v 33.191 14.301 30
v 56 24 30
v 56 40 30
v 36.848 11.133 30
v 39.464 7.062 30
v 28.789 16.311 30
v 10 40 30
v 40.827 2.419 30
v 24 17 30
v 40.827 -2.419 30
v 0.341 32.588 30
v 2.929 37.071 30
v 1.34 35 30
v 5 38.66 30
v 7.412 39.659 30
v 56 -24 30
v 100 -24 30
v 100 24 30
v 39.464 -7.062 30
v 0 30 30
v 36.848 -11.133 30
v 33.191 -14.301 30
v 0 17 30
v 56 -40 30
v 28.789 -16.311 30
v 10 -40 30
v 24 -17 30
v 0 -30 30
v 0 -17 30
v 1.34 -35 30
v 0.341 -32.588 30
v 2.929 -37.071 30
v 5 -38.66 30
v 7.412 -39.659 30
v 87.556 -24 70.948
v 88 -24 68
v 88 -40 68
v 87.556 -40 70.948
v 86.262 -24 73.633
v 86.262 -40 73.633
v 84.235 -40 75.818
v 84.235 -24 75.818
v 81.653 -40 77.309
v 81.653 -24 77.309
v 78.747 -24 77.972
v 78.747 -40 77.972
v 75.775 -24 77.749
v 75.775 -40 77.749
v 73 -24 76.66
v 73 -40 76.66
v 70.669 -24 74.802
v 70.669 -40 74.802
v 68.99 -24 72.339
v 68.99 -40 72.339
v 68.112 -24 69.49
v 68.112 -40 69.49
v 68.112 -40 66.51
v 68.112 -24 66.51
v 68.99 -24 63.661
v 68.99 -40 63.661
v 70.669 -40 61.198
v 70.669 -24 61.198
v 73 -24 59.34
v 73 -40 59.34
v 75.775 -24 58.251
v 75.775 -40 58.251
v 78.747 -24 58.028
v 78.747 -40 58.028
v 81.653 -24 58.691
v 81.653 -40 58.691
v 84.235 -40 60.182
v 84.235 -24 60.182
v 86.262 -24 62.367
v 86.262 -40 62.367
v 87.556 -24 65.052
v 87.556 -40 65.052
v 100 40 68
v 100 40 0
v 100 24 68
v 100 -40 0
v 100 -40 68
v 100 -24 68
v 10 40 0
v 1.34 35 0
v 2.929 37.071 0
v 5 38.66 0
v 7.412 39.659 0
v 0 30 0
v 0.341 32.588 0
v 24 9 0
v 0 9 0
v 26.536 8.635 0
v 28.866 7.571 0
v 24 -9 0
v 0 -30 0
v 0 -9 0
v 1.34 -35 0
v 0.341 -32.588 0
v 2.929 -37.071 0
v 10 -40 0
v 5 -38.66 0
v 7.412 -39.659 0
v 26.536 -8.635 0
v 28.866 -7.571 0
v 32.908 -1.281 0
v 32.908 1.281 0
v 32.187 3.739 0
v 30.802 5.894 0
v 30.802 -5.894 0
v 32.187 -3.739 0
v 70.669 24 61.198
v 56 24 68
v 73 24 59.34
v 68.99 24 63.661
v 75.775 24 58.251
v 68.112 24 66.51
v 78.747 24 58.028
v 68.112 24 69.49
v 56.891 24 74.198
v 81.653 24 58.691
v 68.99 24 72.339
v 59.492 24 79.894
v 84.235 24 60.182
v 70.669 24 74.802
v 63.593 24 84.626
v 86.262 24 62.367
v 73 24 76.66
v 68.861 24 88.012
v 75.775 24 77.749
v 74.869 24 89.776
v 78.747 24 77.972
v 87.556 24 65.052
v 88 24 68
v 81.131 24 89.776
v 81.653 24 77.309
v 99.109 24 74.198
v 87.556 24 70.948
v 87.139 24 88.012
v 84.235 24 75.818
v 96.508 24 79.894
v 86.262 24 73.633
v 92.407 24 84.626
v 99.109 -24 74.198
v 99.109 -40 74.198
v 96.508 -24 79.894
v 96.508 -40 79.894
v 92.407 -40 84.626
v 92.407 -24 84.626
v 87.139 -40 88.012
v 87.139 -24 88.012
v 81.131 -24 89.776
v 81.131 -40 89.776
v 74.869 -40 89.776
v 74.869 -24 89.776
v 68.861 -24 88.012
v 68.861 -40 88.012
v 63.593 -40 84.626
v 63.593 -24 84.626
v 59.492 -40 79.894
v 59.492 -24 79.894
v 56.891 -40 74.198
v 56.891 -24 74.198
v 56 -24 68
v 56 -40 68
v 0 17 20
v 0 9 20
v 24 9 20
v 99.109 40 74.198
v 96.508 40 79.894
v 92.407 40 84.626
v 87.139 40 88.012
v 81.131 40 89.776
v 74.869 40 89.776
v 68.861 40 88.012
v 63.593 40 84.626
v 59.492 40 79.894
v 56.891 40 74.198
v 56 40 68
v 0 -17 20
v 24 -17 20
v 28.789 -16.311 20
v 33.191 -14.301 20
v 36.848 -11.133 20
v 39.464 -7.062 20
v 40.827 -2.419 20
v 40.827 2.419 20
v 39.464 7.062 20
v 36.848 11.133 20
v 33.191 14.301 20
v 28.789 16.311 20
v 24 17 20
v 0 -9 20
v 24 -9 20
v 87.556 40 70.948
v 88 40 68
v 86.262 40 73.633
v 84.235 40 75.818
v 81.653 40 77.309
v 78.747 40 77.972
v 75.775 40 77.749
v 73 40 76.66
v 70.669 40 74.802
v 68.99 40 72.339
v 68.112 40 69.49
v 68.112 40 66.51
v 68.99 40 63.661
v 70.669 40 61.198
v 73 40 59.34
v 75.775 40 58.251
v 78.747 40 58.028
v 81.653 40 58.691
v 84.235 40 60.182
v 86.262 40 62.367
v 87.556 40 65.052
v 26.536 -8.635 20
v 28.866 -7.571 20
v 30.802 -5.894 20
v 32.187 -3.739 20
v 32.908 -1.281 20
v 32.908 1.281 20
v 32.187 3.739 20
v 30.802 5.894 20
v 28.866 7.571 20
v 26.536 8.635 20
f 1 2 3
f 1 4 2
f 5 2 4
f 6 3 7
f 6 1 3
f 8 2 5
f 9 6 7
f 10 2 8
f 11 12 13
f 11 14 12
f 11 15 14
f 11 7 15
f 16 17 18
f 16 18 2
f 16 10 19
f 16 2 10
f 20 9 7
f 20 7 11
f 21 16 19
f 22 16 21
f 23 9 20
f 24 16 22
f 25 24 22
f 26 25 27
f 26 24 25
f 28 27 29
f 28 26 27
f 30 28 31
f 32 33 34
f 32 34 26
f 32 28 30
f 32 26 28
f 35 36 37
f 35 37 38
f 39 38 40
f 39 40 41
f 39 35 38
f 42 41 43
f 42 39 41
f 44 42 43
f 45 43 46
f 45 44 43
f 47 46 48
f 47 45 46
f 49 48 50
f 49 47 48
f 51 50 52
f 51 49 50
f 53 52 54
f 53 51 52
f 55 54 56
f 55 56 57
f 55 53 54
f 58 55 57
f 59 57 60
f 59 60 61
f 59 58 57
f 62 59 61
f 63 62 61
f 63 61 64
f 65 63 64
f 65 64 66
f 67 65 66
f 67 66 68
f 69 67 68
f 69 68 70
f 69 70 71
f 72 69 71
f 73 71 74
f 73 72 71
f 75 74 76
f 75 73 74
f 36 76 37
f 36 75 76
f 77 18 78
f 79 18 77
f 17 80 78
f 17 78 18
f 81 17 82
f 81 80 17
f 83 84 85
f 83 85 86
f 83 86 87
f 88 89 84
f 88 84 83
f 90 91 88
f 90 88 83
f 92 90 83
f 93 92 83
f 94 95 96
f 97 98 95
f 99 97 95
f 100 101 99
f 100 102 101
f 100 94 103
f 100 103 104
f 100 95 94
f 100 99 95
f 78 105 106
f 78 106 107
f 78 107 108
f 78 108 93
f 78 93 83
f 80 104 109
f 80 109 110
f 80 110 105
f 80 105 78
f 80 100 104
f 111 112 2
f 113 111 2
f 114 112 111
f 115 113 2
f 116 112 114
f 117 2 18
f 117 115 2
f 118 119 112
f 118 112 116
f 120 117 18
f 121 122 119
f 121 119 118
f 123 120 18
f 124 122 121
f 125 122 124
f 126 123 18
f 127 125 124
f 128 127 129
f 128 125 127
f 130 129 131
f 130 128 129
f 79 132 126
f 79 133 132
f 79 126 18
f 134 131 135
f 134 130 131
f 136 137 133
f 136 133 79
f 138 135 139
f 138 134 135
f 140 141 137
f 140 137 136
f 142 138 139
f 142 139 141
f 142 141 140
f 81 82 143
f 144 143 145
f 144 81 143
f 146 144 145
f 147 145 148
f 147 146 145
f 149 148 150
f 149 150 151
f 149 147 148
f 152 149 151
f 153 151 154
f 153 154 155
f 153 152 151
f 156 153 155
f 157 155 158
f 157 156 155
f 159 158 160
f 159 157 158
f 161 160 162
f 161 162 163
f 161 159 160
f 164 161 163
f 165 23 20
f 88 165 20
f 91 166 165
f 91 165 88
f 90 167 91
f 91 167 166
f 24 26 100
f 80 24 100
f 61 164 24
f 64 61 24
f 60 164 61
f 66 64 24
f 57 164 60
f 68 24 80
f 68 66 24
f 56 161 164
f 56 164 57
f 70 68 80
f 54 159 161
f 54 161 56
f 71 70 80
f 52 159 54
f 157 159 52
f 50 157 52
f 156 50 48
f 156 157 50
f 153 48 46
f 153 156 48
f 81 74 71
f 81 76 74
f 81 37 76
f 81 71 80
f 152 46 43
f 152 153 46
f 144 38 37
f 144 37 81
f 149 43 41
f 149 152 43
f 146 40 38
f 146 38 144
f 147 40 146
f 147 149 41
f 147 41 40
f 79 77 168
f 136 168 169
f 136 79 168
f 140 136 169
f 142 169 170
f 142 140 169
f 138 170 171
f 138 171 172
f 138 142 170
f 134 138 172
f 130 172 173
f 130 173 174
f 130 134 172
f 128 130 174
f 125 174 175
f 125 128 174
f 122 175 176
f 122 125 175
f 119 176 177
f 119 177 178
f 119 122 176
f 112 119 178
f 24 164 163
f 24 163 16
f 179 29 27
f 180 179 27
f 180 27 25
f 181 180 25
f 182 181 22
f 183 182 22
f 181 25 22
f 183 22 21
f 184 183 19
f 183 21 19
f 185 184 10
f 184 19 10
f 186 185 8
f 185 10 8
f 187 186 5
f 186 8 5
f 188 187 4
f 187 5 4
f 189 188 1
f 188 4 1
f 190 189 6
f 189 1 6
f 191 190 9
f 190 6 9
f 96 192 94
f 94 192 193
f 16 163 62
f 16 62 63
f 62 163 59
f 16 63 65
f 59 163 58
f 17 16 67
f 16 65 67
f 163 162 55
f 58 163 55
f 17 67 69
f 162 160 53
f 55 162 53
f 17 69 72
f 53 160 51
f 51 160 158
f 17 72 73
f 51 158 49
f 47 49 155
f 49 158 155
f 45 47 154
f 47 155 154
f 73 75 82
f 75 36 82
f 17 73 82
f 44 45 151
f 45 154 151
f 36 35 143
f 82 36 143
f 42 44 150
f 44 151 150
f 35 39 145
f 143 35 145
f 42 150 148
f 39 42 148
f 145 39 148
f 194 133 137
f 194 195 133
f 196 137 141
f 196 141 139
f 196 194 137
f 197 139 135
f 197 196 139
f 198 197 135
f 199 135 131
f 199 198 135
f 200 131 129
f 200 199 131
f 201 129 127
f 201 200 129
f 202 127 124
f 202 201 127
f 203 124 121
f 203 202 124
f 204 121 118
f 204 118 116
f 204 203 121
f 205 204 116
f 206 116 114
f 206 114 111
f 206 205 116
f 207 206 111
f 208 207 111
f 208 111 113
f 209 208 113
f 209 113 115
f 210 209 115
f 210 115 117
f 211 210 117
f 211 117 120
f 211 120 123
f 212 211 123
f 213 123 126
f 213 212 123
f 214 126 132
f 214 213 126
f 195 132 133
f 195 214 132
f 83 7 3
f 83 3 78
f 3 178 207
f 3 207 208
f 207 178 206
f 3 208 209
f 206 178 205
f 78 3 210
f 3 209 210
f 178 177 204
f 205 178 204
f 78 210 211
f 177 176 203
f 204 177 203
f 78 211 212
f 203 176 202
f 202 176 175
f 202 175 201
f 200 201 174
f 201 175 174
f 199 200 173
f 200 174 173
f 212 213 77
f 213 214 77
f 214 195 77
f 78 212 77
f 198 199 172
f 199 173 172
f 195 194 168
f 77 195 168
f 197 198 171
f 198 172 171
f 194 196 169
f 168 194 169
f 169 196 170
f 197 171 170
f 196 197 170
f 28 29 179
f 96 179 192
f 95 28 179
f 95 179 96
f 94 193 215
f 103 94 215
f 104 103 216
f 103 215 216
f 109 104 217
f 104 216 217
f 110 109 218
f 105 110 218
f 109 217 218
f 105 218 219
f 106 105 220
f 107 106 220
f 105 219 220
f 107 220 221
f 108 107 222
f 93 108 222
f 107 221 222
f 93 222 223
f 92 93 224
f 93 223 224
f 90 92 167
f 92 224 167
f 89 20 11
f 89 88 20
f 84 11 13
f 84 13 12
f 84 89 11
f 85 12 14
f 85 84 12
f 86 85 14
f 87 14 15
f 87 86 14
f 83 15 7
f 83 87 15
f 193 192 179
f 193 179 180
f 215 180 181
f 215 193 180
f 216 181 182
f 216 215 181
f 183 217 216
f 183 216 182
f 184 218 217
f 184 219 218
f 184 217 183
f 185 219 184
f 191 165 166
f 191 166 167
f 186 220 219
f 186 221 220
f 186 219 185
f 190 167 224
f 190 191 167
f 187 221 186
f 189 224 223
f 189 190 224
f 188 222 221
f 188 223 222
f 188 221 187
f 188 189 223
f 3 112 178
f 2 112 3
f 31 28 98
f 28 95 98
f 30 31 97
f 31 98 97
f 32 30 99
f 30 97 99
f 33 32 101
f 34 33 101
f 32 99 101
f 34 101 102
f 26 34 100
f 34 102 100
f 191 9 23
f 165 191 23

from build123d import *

# Parameters (mm, degrees)
F0_R     = 10
F1_DEPTH = 40
F2_DEPTH = 24
F5_DEPTH = 10
F6_DEPTH = 30.001
F7_R     = 10


with BuildPart() as f1:
    # F0 (on Front) → F1 (new body, symmetric)
    with BuildSketch(Plane.XZ):
        Polygon((0, 30), (0, 0), (100, 0), (100, 30), (56, 30), align=None)
        with BuildLine():
            Line((56, 30), (100, 30))
            Line((100, 30), (100, 68))
            ThreePointArc((100, 68), (78, 90), (56, 68))
            Line((56, 68), (56, 30))
        make_face()
        with Locations((78, 68)):
            Circle(F0_R, mode=Mode.SUBTRACT)
    extrude(amount=F1_DEPTH, both=True)

    # F0 (on Front) → F2 (cut, symmetric)
    with BuildSketch(Plane.XZ):
        with BuildLine():
            Line((56, 30), (100, 30))
            Line((100, 30), (100, 68))
            ThreePointArc((100, 68), (78, 90), (56, 68))
            Line((56, 68), (56, 30))
        make_face()
        with Locations((78, 68)):
            Circle(F0_R, mode=Mode.SUBTRACT)
    extrude(amount=F2_DEPTH, both=True, mode=Mode.SUBTRACT)

    # F4 (on face) → F5 (cut)
    with BuildSketch(Plane.XY.offset(30)):
        with BuildLine():
            Line((0, -17), (24, -17))
            ThreePointArc((24, -17), (41, 0), (24, 17))
            Line((24, 17), (0, 17))
            Line((0, 17), (0, 9))
            Line((0, 9), (24, 9))
            ThreePointArc((24, 9), (33, 0), (24, -9))
            Line((24, -9), (0, -9))
            Line((0, -9), (0, -17))
        make_face()
        with BuildLine():
            Line((0, 9), (0, -9))
            Line((0, -9), (24, -9))
            ThreePointArc((24, -9), (33, 0), (24, 9))
            Line((24, 9), (0, 9))
        make_face()
    extrude(amount=-F5_DEPTH, mode=Mode.SUBTRACT)

    # F4 (on face) → F6 (cut, through all)
    with BuildSketch(Plane.XY.offset(30)):
        with BuildLine():
            Line((0, 9), (0, -9))
            Line((0, -9), (24, -9))
            ThreePointArc((24, -9), (33, 0), (24, 9))
            Line((24, 9), (0, 9))
        make_face()
    extrude(amount=-F6_DEPTH, mode=Mode.SUBTRACT)

    # F7
    f7_edges = [f1.edges().sort_by_distance(p)[0] for p in [
        (0, -40, 15),
        (0, 40, 15),
    ]]
    fillet(f7_edges, radius=F7_R)


solid = f1.part
